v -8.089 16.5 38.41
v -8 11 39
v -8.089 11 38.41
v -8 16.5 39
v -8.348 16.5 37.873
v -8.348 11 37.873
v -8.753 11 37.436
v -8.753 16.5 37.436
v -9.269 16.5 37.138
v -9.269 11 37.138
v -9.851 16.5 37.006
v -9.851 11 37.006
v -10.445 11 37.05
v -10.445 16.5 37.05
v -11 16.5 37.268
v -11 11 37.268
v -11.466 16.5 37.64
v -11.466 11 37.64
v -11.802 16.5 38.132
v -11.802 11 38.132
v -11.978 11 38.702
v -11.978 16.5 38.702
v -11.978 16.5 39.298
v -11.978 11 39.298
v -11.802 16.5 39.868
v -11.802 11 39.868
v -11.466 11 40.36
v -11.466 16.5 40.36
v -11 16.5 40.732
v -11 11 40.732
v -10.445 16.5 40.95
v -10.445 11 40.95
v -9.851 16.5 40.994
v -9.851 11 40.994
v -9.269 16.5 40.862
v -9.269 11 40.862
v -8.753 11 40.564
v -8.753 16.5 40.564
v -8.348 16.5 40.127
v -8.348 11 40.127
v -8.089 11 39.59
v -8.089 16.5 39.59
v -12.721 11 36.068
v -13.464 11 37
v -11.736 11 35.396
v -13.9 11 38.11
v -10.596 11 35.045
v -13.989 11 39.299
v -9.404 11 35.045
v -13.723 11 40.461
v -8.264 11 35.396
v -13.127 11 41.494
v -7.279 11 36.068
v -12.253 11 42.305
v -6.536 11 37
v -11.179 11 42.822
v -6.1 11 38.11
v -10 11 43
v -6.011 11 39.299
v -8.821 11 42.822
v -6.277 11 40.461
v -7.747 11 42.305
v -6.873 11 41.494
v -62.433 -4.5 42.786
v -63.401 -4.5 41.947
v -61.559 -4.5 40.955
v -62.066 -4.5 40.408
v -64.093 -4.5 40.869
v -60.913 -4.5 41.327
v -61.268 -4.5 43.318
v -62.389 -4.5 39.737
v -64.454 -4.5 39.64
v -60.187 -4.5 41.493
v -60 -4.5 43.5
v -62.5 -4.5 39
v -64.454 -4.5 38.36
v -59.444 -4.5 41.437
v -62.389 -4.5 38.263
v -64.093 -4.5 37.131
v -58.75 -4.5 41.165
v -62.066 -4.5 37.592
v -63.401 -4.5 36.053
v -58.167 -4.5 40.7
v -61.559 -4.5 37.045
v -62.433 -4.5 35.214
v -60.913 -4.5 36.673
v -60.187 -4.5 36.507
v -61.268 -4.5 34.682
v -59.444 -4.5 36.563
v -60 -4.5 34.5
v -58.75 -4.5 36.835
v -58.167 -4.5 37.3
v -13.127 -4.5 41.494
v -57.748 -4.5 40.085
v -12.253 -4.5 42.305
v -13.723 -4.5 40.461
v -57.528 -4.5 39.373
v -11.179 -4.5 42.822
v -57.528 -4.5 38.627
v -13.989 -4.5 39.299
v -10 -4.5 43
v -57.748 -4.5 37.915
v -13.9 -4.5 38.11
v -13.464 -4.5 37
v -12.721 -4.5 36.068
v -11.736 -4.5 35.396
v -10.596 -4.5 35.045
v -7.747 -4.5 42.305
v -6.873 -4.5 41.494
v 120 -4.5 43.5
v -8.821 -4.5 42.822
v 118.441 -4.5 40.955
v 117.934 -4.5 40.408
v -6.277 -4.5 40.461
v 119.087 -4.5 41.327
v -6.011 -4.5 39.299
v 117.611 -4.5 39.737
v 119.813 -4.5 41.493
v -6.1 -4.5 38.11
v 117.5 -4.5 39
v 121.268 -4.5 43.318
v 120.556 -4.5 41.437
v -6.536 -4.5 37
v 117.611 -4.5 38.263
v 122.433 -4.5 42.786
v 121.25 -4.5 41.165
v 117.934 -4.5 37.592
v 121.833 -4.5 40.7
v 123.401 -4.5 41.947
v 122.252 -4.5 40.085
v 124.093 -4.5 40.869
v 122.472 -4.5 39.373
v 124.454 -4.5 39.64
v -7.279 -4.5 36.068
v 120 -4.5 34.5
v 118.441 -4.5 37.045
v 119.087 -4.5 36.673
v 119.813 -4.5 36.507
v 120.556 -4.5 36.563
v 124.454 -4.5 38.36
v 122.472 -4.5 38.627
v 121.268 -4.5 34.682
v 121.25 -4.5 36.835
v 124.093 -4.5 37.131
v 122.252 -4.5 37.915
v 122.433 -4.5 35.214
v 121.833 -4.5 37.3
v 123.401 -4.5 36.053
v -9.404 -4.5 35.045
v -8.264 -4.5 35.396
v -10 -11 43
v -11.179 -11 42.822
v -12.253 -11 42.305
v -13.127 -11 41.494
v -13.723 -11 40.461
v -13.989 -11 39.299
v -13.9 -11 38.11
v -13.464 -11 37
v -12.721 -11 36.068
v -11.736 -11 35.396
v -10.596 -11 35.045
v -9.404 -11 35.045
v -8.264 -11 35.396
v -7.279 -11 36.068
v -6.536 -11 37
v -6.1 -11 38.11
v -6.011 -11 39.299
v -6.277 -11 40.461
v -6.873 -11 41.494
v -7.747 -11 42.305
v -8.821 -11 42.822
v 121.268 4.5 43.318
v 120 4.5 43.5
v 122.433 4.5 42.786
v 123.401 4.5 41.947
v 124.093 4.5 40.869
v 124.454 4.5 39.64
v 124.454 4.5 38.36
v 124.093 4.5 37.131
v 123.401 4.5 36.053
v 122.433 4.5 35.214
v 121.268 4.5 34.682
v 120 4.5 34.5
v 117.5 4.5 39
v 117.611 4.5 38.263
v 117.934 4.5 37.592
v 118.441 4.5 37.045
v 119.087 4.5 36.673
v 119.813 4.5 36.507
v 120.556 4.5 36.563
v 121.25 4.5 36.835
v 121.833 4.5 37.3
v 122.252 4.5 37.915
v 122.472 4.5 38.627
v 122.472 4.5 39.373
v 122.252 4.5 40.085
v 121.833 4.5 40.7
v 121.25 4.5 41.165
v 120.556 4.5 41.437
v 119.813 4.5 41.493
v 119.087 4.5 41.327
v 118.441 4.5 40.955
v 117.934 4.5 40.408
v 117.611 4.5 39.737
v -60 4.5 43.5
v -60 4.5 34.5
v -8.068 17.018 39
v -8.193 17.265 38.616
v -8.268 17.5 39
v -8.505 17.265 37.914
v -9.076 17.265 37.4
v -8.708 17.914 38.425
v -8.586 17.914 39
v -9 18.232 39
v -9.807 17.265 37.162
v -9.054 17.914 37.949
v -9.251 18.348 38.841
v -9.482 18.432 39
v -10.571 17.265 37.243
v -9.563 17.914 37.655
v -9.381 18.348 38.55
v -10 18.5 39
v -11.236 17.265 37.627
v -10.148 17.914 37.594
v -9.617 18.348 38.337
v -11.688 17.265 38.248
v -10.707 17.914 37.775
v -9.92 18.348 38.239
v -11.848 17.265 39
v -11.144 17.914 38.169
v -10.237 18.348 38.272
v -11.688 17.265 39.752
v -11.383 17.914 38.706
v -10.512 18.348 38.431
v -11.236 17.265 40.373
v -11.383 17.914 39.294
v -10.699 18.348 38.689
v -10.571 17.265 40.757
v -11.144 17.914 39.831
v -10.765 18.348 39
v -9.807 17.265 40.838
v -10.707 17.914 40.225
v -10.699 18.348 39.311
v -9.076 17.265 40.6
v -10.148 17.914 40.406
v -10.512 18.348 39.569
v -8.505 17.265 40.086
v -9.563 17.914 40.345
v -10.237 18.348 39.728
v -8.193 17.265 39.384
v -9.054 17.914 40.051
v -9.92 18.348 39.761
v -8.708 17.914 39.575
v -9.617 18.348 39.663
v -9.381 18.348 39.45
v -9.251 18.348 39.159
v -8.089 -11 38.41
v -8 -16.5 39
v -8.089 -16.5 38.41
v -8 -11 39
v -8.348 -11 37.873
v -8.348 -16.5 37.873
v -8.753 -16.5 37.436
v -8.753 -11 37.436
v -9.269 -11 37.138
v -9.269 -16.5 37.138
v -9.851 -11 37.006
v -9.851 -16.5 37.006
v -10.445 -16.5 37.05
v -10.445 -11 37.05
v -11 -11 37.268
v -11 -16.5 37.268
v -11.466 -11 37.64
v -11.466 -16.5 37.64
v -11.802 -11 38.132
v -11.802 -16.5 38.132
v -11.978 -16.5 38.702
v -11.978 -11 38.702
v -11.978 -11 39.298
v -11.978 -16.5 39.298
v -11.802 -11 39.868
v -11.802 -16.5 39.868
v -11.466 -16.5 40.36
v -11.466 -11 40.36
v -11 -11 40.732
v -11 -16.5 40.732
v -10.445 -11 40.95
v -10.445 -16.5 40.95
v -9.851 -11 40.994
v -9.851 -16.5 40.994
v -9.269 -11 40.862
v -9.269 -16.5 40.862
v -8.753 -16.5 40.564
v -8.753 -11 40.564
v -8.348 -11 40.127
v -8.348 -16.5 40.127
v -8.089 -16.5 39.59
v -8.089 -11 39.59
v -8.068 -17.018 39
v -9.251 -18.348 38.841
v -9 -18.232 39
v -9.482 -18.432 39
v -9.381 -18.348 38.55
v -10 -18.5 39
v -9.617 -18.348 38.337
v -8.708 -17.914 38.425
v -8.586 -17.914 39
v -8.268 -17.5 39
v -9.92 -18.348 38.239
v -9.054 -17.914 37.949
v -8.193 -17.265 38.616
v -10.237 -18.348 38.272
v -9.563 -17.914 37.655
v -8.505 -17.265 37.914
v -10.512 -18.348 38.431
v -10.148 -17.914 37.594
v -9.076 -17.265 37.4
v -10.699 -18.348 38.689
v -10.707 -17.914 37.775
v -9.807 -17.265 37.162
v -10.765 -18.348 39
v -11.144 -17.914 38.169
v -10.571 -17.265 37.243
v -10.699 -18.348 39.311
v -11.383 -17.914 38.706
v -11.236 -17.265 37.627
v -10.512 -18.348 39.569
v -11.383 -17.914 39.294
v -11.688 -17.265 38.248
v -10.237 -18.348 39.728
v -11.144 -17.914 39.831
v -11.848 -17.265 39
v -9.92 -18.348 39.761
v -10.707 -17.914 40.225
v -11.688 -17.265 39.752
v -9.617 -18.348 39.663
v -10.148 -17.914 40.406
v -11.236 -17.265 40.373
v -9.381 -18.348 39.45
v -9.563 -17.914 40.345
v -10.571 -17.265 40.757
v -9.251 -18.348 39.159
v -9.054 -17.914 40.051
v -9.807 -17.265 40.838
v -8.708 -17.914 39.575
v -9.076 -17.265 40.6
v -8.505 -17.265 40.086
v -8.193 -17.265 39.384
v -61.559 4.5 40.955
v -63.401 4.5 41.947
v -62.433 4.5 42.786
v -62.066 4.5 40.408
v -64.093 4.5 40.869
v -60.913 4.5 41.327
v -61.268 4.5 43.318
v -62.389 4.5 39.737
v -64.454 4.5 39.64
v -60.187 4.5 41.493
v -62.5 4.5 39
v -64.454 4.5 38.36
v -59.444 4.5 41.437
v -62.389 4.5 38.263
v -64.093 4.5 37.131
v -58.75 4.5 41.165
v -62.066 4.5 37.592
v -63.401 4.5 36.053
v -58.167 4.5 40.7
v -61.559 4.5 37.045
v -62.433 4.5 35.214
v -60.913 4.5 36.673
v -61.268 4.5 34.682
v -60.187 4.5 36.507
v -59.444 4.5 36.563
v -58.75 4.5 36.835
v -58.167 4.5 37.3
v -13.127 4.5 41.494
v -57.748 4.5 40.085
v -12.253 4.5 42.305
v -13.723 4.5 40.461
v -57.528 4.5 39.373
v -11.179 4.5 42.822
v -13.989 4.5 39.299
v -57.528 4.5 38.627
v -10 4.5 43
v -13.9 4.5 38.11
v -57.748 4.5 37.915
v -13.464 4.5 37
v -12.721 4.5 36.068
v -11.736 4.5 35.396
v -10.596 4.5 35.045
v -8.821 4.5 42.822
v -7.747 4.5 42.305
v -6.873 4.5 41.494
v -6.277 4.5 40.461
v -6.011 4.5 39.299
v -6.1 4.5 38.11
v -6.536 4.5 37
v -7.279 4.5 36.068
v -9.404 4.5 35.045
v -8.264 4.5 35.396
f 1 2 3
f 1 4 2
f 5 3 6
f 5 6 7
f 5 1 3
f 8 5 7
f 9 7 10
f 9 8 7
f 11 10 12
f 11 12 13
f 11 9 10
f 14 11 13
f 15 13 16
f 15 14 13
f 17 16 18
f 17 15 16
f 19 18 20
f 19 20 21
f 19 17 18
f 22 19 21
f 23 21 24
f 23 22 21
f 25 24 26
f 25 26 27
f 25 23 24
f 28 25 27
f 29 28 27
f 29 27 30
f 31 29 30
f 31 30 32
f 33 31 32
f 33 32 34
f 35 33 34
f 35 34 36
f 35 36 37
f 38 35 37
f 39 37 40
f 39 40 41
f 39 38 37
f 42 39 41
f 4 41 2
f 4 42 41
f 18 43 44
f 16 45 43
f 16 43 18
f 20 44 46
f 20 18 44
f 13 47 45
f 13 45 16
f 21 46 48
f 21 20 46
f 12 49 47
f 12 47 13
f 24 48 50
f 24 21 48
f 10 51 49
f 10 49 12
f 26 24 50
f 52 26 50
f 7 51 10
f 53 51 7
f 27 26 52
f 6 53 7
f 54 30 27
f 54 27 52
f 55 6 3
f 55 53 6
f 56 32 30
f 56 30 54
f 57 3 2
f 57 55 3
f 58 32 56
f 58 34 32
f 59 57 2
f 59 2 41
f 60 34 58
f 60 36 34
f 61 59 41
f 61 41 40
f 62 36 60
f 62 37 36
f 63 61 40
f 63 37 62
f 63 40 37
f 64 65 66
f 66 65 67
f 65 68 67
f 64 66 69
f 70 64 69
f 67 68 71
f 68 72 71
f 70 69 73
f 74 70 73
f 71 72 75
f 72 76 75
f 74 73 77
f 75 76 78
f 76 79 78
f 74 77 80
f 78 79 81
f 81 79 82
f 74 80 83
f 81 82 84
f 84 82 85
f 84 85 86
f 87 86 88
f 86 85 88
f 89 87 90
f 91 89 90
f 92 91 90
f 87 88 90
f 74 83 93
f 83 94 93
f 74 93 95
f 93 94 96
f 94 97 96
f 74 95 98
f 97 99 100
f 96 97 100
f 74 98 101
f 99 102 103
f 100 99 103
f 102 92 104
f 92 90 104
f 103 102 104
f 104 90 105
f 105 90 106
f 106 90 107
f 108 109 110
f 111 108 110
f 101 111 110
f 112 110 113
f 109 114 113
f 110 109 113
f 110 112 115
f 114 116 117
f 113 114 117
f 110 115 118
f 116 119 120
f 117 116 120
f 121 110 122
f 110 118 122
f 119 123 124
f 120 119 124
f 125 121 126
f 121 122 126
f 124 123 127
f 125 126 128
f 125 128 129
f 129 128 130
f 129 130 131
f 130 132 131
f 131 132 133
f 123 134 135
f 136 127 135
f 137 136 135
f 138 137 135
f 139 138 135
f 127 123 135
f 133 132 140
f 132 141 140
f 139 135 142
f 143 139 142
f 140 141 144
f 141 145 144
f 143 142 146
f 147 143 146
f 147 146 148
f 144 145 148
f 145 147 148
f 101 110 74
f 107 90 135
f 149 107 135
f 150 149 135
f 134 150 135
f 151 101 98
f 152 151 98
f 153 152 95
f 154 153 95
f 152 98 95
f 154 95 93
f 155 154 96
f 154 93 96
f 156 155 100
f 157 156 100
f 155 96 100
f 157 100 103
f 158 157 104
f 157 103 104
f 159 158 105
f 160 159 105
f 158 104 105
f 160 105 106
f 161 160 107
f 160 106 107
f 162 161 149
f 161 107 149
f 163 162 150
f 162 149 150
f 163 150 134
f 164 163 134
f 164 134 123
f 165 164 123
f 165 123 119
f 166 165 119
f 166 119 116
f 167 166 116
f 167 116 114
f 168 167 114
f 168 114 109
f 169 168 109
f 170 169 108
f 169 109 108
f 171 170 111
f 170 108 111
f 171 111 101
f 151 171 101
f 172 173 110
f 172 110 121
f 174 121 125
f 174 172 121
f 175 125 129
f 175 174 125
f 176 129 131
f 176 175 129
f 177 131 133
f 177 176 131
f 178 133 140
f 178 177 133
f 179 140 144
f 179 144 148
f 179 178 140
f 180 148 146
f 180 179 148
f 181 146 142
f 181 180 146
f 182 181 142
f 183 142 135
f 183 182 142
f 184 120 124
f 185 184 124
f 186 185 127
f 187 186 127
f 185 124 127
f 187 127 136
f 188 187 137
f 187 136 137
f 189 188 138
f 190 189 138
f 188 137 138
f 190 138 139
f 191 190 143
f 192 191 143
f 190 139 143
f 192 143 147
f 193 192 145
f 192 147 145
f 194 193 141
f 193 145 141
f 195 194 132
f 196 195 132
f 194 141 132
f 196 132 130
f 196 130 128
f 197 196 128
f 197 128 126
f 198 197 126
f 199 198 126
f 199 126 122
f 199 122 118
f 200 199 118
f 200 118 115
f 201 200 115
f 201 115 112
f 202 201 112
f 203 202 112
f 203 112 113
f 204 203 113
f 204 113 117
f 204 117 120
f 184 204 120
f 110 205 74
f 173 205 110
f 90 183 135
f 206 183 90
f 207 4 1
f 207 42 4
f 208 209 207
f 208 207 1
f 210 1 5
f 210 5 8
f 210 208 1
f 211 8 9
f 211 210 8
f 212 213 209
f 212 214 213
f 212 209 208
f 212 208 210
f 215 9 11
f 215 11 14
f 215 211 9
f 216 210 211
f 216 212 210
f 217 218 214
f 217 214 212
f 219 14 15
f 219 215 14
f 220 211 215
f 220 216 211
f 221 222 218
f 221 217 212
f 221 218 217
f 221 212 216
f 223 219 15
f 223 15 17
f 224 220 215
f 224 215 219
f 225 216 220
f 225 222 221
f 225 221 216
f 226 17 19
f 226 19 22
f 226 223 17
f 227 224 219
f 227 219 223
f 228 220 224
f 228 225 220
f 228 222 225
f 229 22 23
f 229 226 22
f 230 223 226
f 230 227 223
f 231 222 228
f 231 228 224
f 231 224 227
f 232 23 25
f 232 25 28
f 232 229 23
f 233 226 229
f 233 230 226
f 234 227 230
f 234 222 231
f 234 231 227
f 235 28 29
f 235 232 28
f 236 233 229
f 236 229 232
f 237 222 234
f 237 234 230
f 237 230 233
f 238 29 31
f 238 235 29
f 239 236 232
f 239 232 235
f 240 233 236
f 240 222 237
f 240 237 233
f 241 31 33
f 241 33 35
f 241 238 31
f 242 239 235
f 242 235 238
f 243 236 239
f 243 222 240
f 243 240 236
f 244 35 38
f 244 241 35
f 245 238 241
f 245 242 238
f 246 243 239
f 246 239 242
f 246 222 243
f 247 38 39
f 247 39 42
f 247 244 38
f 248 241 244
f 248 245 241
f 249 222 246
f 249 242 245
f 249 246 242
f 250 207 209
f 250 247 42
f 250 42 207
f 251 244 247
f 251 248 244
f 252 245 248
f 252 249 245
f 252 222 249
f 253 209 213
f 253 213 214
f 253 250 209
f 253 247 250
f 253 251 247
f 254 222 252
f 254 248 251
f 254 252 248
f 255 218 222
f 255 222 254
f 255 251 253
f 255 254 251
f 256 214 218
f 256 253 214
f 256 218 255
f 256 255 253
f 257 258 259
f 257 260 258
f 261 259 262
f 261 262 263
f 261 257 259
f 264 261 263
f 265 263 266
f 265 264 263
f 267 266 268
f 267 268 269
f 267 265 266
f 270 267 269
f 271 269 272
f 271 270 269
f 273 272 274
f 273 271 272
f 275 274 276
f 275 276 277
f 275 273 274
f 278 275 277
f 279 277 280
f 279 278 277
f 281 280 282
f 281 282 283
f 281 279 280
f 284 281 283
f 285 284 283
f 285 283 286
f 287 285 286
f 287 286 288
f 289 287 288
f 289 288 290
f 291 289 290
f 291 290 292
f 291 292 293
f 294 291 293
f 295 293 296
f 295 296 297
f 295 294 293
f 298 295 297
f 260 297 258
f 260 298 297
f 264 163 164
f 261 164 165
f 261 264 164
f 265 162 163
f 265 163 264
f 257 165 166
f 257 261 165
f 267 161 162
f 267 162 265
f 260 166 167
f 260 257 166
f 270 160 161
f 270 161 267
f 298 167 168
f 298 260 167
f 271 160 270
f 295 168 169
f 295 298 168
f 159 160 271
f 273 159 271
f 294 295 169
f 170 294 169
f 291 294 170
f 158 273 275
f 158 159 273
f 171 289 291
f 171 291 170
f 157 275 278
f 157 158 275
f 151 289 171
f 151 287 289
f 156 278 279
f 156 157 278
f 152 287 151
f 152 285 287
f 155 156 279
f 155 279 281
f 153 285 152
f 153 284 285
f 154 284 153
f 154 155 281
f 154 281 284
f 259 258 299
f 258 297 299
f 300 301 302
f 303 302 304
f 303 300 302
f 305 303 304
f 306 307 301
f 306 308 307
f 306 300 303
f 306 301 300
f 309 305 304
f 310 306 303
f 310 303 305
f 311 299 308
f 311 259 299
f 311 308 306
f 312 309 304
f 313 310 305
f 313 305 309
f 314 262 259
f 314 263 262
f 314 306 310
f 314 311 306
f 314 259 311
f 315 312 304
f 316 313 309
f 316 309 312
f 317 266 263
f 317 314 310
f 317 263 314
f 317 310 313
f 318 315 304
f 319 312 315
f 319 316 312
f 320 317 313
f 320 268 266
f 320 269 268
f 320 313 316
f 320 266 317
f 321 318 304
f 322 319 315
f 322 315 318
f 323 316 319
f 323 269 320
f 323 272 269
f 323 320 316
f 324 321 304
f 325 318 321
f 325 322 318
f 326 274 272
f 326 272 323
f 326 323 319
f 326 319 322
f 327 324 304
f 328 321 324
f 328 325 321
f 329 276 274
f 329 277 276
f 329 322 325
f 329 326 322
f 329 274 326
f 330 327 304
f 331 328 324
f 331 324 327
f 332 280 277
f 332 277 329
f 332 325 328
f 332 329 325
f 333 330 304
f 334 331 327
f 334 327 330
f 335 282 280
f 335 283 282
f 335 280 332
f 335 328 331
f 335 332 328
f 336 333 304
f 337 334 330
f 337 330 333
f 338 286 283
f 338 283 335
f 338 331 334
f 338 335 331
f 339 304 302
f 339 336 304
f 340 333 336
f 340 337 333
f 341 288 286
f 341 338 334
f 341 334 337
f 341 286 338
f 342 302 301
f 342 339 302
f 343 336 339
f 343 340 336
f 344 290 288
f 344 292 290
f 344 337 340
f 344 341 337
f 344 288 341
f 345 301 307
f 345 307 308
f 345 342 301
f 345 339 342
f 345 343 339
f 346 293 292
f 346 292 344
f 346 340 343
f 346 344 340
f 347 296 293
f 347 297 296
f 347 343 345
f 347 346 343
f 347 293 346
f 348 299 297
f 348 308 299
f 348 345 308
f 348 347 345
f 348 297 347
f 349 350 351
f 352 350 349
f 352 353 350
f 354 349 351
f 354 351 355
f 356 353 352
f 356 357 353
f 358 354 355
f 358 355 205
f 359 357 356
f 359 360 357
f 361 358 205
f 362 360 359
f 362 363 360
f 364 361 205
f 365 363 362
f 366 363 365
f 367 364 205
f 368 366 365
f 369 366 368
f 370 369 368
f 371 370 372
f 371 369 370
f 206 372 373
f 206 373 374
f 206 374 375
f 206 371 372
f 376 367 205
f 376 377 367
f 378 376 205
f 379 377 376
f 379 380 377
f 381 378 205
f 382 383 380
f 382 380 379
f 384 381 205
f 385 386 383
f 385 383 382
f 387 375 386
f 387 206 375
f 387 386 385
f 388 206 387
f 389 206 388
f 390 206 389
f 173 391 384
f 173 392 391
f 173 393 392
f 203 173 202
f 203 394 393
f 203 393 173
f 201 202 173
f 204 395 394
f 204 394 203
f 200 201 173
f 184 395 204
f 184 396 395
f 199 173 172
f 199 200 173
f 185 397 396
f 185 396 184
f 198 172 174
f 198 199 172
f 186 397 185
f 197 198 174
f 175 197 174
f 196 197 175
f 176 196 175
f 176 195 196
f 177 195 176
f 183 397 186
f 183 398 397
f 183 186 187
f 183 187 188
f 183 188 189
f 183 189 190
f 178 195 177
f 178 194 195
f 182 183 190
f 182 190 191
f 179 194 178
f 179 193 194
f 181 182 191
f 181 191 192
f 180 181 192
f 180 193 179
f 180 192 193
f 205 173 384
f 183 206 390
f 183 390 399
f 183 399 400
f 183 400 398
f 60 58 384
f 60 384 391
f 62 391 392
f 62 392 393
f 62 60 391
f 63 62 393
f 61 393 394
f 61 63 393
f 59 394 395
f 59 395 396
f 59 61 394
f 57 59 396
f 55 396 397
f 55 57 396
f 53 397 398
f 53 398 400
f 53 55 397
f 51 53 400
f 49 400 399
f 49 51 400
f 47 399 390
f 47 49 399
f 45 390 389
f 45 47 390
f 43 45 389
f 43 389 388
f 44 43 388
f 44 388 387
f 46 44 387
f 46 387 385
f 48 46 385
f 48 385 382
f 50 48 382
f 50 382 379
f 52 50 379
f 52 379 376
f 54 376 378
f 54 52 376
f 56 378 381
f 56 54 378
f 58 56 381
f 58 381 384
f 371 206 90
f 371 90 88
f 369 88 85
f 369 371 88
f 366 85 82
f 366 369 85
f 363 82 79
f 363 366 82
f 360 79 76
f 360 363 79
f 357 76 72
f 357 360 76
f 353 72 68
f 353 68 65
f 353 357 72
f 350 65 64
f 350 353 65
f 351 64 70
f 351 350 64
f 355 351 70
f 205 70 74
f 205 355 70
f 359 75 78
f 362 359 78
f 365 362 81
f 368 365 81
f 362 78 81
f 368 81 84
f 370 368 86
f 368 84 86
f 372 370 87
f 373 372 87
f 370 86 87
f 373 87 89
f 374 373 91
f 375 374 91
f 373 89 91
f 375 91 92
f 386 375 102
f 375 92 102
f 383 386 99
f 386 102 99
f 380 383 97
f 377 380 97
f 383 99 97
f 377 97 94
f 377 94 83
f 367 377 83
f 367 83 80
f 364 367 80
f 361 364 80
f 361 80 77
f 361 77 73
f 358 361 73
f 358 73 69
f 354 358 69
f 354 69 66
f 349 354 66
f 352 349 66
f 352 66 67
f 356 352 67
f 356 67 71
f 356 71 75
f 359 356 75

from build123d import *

# Parameters (mm, degrees)
BOSS_EXTRUDE1_DEPTH          = 9
SKETCH2_R                    = 4
BOSS_EXTRUDE2_DEPTH          = 6.5
BOSS_EXTRUDE4_START          = 6.5
SKETCH4_R                    = 4
BOSS_EXTRUDE4_DEPTH          = 6.5
F_5_0_5_DIAMETER_HOLE1_D     = 5
F_5_0_5_DIAMETER_HOLE1_DEPTH = 23


# Read off the part's stored shape, not the designer's step: Boss-Extrude3, Boss-Extrude5
with BuildPart() as part:
    # Sketch1 → Boss-Extrude1 (new body)
    with BuildSketch(Plane(origin=(0, 4.5, 0), x_dir=(1, 0, 0), z_dir=(0, 1, 0))):
        with BuildLine():
            Line((-60, -43.5), (120, -43.5))
            ThreePointArc((120, -43.5), (124.5, -39), (120, -34.5))
            Line((120, -34.5), (-60, -34.5))
            ThreePointArc((-60, -34.5), (-64.5, -39), (-60, -43.5))
        make_face()
    extrude(amount=-BOSS_EXTRUDE1_DEPTH)

    # Sketch2 → Boss-Extrude2 (add)
    with BuildSketch(Plane.XZ.offset(4.5)):
        with Locations(Location((-10, 39, 0), (0, 0, 90))):
            Circle(SKETCH2_R)
    extrude(amount=BOSS_EXTRUDE2_DEPTH)

    # Boss-Extrude3 outline → Boss-Extrude3 (revolve)
    with BuildSketch(Plane(origin=(-10, 0, 39), x_dir=(1, 0, 0), z_dir=(0, 0, 1))):
        with BuildLine():
            ThreePointArc((0, -18.5), (1.414213563, -17.914213562), (2, -16.499999998))
            Line((2, -16.499999998), (2, -11))
            Line((2, -11), (0, -11))
            Line((0, -11), (0, -18.5))
        make_face()
    revolve(axis=Axis((-10, 0, 39), (0, 1, 0)))

    # Sketch4 → Boss-Extrude4 (add)
    with BuildSketch(Plane(origin=(0, 4.5, 0), x_dir=(-1, 0, 0), z_dir=(0, 1, 0)).offset(BOSS_EXTRUDE4_START)):
        with Locations(Location((10, 39, 0), (0, 0, 90))):
            Circle(SKETCH4_R)
    extrude(amount=-BOSS_EXTRUDE4_DEPTH)

    # Boss-Extrude5 outline → Boss-Extrude5 (revolve)
    with BuildSketch(Plane(origin=(-10, 0, 39), x_dir=(1, 0, 0), z_dir=(0, 0, 1))):
        with BuildLine():
            Line((2, 11), (2, 16.499999998))
            ThreePointArc((2, 16.499999998), (1.414213563, 17.914213562), (0, 18.5))
            Line((0, 18.5), (0, 11))
            Line((0, 11), (2, 11))
        make_face()
    revolve(axis=Axis((-10, 0, 39), (0, 1, 0)))

    # Ø5.0 (5) Diameter Hole1
    with Locations(Plane(origin=(0, 4.5, 0), x_dir=(1, 0, 0), z_dir=(0, 1, 0))):
        with Locations((-60, -39), (120, -39)):
            Hole(F_5_0_5_DIAMETER_HOLE1_D / 2, depth=F_5_0_5_DIAMETER_HOLE1_DEPTH)


solid = part.part
